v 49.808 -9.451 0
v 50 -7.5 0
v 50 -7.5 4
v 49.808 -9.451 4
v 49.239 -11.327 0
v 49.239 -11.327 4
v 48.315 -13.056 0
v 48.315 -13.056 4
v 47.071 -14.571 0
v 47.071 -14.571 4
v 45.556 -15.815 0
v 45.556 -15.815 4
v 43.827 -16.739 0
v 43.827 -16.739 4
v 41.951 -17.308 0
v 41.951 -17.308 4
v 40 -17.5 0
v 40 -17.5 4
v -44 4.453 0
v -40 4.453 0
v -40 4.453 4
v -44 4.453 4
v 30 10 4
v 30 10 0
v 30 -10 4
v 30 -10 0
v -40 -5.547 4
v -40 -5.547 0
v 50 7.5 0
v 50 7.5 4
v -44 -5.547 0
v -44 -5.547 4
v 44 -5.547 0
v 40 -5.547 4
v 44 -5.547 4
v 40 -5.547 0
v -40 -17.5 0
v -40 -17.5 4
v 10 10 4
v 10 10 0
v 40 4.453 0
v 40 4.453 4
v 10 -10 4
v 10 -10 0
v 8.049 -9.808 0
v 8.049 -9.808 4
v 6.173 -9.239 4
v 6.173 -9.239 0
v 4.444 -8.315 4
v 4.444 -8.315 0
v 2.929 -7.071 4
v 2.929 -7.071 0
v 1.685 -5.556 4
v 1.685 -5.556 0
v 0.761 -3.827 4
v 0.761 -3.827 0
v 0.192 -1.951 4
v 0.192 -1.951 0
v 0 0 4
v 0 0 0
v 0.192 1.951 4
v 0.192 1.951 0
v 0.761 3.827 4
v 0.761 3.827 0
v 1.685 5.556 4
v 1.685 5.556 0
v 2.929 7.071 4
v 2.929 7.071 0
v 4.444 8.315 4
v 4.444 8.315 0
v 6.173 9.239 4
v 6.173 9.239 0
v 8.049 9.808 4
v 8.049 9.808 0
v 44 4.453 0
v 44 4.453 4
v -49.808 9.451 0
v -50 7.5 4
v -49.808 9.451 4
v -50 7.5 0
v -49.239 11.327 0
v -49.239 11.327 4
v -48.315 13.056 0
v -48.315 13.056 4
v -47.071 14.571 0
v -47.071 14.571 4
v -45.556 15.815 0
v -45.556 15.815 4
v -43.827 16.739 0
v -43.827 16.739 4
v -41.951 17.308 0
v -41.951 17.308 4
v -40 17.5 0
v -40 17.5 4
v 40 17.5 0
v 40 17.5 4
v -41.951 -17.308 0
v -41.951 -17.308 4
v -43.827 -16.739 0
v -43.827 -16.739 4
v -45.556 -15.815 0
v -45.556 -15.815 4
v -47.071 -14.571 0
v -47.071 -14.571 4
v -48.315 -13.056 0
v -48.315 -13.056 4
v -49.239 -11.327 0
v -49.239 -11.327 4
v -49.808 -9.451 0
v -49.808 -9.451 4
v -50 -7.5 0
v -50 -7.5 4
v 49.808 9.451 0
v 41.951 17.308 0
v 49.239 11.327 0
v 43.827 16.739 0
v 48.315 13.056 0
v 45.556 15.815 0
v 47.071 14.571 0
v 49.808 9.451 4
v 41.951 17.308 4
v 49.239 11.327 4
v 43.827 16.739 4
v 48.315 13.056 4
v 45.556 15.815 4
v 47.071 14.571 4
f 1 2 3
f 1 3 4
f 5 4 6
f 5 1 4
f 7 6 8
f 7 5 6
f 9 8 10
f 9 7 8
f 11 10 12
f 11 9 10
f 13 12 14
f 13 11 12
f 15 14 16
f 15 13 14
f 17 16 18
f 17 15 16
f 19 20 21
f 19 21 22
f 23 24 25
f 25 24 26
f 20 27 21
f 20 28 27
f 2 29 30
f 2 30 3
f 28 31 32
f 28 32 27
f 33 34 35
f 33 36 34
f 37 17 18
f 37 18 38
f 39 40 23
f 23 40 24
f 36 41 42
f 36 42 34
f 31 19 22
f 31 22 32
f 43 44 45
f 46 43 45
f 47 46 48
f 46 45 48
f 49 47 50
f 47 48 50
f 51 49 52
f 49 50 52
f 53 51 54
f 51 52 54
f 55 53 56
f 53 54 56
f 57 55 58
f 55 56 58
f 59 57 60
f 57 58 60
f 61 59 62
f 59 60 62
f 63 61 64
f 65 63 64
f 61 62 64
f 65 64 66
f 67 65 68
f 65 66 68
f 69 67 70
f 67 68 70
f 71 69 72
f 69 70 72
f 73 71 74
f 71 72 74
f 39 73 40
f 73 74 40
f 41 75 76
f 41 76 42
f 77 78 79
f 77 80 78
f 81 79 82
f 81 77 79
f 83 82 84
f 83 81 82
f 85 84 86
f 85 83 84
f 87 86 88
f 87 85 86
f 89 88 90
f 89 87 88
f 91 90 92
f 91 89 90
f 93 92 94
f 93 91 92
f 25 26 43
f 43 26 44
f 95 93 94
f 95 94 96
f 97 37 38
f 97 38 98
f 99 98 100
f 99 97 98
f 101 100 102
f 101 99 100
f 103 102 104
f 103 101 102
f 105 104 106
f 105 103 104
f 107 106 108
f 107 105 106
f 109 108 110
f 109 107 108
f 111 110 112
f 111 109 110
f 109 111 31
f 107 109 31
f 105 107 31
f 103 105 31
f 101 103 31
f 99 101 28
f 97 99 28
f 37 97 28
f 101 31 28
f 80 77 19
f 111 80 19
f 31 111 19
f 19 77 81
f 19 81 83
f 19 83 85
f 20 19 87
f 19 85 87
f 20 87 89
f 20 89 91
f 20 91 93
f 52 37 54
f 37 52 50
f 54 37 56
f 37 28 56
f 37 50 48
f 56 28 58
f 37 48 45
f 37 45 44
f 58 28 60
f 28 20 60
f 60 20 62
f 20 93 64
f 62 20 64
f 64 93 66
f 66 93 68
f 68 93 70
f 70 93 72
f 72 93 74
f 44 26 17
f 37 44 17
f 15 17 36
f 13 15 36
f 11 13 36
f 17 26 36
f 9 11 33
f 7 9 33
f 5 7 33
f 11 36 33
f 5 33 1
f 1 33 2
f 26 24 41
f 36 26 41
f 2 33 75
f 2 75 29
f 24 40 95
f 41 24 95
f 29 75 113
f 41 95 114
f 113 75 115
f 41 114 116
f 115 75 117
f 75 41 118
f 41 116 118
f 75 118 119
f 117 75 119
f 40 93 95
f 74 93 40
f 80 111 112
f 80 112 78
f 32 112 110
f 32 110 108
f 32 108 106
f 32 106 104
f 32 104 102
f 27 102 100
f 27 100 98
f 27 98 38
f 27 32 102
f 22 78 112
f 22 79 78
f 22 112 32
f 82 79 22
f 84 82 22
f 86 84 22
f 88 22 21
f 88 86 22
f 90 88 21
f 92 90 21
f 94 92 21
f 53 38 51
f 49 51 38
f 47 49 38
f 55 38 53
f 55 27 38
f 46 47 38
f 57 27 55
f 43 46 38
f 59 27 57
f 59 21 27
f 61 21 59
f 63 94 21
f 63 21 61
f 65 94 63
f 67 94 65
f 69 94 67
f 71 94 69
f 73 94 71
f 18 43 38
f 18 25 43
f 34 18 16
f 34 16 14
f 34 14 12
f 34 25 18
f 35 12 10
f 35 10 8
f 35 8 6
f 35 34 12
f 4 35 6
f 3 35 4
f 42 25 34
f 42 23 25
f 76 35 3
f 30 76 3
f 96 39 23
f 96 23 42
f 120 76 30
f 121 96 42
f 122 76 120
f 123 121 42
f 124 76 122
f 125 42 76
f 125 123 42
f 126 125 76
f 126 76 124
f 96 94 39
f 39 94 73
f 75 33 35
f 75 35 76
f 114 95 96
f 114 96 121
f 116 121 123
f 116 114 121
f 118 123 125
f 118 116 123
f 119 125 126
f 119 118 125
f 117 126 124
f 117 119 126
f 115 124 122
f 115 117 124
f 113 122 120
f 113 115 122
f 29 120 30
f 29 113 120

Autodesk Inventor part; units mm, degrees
ref_plane "YZ Plane" through (0, 0, 0) normal (1, 0, 0) x (0, 1, 0)
ref_plane "XZ Plane" through (0, 0, 0) normal (0, 1, 0) x (-1, 0, 0)
ref_plane "XY Plane" through (0, 0, 0) normal (0, 0, 1) x (1, 0, 0)
sketch "Эскиз1" plane through (0, 0, 0) normal (0, 0, 1) x (1, 0, 0)
  line L0 (40, -17.5) -> (22.4906, -17.5) projected
  arc A0 (40, -17.5) -> (50, -7.5) centre (40, -7.5) ccw projected
  line L1 (50, 7.5) -> (50, -7.5) projected
  arc A1 (50, 7.5) -> (40, 17.5) centre (40, 7.5) ccw projected
  line L2 (22.4906, 17.5) -> (40, 17.5) projected
  arc A2 (22.4906, 17.5) -> (53.3569, 60.2081) centre (-76.5583, 121.5932) ccw projected
  arc A3 (53.3569, 60.2081) -> (49.04, 63.7734) centre (57.3118, 69.3928) ccw projected
  arc A4 (49.04, 63.7734) -> (8.22, 17.5) centre (133.8701, -52.2004) ccw projected
  line L3 (-8.22, 17.5) -> (8.22, 17.5) projected
  arc A5 (-8.22, 17.5) -> (-49.04, 63.7734) centre (-133.8701, -52.2004) ccw projected
  arc A6 (-49.04, 63.7734) -> (-53.3569, 60.2081) centre (-57.3118, 69.3928) ccw projected
  arc A7 (-53.3569, 60.2081) -> (-22.4906, 17.5) centre (76.5583, 121.5932) ccw projected
  line L4 (-40, 17.5) -> (-22.4906, 17.5) projected
  arc A8 (-40, 17.5) -> (-50, 7.5) centre (-40, 7.5) ccw projected
  line L5 (-50, -7.5) -> (-50, 7.5) projected
  arc A9 (-50, -7.5) -> (-40, -17.5) centre (-40, -7.5) ccw projected
  line L6 (-22.4906, -17.5) -> (-40, -17.5) projected
  arc A10 (-22.4906, -17.5) -> (-53.3569, -60.2081) centre (76.5583, -121.5932) ccw projected
  arc A11 (-53.3569, -60.2081) -> (-49.04, -63.7734) centre (-57.3118, -69.3928) ccw projected
  arc A12 (-49.04, -63.7734) -> (-8.22, -17.5) centre (-133.8701, 52.2004) ccw projected
  line L7 (8.22, -17.5) -> (-8.22, -17.5) projected
  arc A13 (8.22, -17.5) -> (49.04, -63.7734) centre (133.8701, 52.2004) ccw projected
  arc A14 (49.04, -63.7734) -> (53.3569, -60.2081) centre (57.3118, -69.3928) ccw projected
  arc A15 (53.3569, -60.2081) -> (22.4906, -17.5) centre (-76.5583, -121.5932) ccw projected
  line L8 (22.4906, 17.5) -> (-22.4906, 17.5)
  line L9 (-22.4906, -17.5) -> (22.4906, -17.5)
  line L10 (25, 12.5) -> (25, 8.5) projected
  line L11 (25, 8.5) -> (15, 8.5) projected
  line L12 (15, 8.5) -> (15, 12.5) projected
  line L13 (15, 12.5) -> (25, 12.5) projected
  line L14 (-15, -8.5) -> (-15, -12.5) projected
  line L15 (-15, -12.5) -> (-25, -12.5) projected
  line L16 (-25, -12.5) -> (-25, -8.5) projected
  line L17 (-25, -8.5) -> (-15, -8.5) projected
  line L18 (25, -12.5) -> (15, -12.5) projected
  line L19 (15, -12.5) -> (15, -8.5) projected
  line L20 (15, -8.5) -> (25, -8.5) projected
  line L21 (25, -8.5) -> (25, -12.5) projected
  line L22 (-15, 8.5) -> (-25, 8.5) projected
  line L23 (-25, 8.5) -> (-25, 12.5) projected
  line L24 (-25, 12.5) -> (-15, 12.5) projected
  line L25 (-15, 12.5) -> (-15, 8.5) projected
  point P0 (0, 0)
  point P1 (8.22, 17.5)
  point P2 (-8.22, -17.5)
extrude "Выдавливание1" add sketch "Эскиз1" along normal blind 4 contours L0 L9 L7 L6 A9 L5 A8 L4 L8 L3 L2 A1 L1 A0 | L10 L11 L12 L13 | L14 L15 L16 L17 | L18 L19 L20 L21 | L22 L23 L24 L25
sketch "Эскиз3" plane through (0, 0, 0) normal (0, 0, -1) x (-1, 0, 0)
  point P0 (0, 0)
sketch "Эскиз4" plane through (0, 0, 0) normal (0, 0, -1) x (-1, 0, 0)
  point P0 (0, 0)
sketch "Эскиз5" plane through (0, 0, 0) normal (0, 0, -1) x (-1, 0, 0)
  line L0 (44, 4.453) -> (44, -5.547) projected
  line L1 (40, -5.547) -> (40, 4.453) projected
  line L2 (40, 4.453) -> (44, 4.453) projected
  line L3 (44, -5.547) -> (40, -5.547) projected
  line L4 (-44, -5.547) -> (-44, 4.453) projected
  line L5 (-40, 4.453) -> (-40, -5.547) projected
  line L6 (-44, 4.453) -> (-40, 4.453) projected
  line L7 (-40, -5.547) -> (-44, -5.547) projected
  line L8 (-10, 10) -> (-30, 10)
  line L9 (-30, 10) -> (-30, -10)
  line L10 (-30, -10) -> (-10, -10)
  line L11 (0, 0) -> (0, 0)
  arc A0 (0, 0) -> (-10, 10) centre (-10, 0) ccw
  arc A1 (-10, -10) -> (0, 0) centre (-10, 0) ccw
  point P0 (0, 0)
  point P1 (0, 10)
  dimension "d4" = 10
  dimension "d5" = 10
  dimension "d6" = 30
  dimension "d7" = 10
  dimension "d8" = 10
  dimension "d9" = 30
extrude "Выдавливание3" cut sketch "Эскиз5" against normal blind 4
sketch "Эскиз6" plane through (0, 0, 0) normal (0, 0, -1) x (-1, 0, 0)
  point P0 (0, 0)
properties part number "top"
